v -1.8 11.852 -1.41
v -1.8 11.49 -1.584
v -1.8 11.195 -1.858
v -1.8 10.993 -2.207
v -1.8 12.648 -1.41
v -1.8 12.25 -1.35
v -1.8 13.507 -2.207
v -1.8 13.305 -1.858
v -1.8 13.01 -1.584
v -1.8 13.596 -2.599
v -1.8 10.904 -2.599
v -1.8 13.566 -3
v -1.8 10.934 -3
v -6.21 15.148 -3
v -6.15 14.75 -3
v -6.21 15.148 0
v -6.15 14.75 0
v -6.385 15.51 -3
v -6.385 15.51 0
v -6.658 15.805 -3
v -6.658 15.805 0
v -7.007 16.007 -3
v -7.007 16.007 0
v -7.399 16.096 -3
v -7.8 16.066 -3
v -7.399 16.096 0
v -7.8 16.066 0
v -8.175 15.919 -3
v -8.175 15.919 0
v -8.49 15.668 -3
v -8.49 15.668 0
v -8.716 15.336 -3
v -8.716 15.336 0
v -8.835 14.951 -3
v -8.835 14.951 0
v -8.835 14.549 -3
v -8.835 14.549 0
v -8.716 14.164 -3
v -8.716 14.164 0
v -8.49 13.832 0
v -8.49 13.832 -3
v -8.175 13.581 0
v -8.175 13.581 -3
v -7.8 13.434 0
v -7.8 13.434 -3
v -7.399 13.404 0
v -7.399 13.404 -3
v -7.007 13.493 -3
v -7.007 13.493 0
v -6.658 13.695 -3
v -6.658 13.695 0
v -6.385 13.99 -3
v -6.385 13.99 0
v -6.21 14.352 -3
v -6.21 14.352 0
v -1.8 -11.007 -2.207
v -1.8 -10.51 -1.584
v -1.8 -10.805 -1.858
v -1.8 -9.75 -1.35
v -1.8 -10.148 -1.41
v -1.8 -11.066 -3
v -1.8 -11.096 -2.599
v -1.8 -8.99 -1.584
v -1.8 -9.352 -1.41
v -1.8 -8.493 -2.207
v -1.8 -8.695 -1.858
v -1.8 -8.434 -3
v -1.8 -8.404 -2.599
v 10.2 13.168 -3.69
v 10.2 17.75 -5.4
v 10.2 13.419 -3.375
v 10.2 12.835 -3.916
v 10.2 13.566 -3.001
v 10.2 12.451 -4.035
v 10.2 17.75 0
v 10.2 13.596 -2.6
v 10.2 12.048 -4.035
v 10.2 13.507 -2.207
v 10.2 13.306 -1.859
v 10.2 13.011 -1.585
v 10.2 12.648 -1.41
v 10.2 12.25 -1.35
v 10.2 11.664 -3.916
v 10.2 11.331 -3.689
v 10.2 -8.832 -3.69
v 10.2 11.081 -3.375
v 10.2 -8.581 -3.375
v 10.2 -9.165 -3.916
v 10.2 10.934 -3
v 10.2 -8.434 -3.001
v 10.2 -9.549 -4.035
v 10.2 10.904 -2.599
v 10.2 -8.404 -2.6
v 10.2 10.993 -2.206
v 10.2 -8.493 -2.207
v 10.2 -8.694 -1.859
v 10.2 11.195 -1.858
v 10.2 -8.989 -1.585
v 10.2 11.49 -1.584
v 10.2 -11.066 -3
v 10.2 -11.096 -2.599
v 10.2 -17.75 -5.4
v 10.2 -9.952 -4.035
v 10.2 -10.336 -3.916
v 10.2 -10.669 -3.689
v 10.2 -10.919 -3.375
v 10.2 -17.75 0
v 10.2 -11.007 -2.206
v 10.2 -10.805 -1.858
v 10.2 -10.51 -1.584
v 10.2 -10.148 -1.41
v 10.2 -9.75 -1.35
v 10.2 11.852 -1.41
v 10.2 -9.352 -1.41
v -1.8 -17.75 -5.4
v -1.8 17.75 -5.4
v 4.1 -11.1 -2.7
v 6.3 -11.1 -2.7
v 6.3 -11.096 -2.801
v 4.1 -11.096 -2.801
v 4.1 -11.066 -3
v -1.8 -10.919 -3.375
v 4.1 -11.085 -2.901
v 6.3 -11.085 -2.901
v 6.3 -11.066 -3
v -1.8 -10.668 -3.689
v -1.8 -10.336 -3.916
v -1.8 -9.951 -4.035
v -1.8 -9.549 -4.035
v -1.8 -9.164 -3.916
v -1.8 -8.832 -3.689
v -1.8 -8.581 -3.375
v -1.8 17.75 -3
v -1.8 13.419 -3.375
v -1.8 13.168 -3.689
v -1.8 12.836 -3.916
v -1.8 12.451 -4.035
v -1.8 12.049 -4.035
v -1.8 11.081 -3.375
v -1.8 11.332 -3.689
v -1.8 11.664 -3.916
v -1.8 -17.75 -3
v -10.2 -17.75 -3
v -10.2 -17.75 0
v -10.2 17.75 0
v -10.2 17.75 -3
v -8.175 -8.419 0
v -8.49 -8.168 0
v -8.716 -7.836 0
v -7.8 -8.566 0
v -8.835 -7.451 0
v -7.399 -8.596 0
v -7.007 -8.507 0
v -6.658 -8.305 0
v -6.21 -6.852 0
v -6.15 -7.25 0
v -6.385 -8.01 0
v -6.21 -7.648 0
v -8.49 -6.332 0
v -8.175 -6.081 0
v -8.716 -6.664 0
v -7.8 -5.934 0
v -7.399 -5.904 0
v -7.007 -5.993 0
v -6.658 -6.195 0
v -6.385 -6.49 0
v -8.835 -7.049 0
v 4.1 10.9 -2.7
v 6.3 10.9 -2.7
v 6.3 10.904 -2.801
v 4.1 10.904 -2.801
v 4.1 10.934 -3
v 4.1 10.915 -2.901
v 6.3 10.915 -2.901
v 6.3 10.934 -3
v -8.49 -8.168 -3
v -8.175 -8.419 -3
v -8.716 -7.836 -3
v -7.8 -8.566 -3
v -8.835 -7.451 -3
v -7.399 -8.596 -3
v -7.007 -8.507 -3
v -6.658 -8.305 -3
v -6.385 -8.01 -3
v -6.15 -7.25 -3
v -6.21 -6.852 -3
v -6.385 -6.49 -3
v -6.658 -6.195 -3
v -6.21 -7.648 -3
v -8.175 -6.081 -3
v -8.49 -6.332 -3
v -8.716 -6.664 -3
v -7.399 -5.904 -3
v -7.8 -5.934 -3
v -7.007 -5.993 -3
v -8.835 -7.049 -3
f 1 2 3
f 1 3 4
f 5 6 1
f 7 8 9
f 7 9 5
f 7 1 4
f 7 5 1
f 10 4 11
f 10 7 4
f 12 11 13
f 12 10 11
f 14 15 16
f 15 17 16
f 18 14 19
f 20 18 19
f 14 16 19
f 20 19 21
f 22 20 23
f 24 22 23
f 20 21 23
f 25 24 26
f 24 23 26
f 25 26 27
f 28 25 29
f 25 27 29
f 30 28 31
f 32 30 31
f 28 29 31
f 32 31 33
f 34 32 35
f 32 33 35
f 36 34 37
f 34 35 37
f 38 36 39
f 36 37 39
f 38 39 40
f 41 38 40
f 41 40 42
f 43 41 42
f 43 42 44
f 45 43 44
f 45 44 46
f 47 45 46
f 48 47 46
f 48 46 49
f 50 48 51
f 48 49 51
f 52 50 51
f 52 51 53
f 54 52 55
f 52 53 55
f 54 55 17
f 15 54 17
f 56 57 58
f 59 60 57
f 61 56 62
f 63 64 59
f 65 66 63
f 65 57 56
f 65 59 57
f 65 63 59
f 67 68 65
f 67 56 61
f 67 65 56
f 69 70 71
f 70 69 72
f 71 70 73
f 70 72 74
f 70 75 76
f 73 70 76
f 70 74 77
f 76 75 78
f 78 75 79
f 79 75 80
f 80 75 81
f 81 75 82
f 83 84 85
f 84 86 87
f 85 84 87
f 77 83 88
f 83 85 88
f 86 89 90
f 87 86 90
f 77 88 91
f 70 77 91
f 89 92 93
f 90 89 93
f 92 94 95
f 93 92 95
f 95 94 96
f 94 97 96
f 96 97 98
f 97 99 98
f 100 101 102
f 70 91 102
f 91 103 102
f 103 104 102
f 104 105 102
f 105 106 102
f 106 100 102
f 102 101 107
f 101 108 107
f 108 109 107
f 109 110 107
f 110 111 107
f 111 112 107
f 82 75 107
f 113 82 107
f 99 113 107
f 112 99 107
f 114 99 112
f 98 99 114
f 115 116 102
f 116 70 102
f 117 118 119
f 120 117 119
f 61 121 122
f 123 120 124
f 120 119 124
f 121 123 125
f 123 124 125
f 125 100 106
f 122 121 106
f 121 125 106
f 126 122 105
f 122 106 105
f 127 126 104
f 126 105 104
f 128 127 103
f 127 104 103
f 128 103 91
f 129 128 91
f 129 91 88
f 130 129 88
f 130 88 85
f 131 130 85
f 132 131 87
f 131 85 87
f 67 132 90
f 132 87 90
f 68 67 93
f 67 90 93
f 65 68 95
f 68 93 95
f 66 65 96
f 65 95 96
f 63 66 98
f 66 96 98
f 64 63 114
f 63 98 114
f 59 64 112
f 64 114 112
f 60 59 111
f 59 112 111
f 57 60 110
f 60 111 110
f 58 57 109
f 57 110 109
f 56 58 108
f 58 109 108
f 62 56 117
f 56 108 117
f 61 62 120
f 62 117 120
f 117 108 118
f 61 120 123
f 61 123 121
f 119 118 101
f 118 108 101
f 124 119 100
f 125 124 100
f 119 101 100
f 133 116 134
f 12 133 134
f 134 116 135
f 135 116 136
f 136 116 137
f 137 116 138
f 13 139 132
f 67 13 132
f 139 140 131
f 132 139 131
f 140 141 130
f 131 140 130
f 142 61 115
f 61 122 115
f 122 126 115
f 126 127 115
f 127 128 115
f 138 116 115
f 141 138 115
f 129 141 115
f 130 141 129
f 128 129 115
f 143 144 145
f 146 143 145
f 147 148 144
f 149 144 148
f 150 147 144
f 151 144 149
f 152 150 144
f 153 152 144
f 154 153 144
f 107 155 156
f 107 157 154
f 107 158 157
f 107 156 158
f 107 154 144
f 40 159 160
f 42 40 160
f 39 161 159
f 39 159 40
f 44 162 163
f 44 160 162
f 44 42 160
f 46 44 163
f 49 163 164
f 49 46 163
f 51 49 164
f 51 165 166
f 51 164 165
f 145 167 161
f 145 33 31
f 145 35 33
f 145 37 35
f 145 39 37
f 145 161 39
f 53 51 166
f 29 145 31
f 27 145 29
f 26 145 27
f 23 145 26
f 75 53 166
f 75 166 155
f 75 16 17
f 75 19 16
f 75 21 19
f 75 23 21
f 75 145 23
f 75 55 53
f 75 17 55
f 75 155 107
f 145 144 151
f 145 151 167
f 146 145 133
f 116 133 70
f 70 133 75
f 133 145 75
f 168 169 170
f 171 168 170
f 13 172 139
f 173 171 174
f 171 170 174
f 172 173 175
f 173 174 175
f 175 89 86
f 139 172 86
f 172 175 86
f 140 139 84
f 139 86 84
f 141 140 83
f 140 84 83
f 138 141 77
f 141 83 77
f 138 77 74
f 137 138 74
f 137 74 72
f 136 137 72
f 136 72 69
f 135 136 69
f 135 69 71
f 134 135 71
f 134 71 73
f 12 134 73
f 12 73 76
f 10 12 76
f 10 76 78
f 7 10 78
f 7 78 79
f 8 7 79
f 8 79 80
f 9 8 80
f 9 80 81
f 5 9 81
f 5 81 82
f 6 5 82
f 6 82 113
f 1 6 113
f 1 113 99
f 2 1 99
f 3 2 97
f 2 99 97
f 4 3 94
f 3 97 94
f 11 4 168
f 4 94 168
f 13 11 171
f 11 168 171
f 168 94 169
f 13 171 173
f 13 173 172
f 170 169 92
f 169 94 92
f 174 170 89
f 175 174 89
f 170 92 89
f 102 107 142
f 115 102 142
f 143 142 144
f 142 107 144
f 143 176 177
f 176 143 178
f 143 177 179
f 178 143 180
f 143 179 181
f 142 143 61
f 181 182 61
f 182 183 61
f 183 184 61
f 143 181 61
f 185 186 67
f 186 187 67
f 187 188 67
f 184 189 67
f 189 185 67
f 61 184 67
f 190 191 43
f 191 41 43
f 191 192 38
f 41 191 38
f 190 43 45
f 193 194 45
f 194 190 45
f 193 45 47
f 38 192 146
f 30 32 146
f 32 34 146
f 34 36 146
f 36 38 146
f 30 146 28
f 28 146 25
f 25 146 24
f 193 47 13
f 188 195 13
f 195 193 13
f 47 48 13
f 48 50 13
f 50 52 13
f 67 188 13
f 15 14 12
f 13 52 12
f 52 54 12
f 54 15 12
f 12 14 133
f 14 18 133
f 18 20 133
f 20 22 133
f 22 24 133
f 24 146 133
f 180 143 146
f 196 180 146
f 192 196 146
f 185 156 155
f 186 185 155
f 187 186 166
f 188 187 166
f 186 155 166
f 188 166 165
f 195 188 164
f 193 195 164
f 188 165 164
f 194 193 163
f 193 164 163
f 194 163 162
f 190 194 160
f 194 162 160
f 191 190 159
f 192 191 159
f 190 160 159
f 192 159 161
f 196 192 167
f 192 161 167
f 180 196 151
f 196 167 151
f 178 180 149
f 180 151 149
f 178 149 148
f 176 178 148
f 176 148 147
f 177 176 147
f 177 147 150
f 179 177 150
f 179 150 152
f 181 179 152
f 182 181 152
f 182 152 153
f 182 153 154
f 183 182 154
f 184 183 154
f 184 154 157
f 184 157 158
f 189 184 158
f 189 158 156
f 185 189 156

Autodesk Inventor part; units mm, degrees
ref_plane "YZ Plane" through (0, 0, 0) normal (1, 0, 0) x (0, 1, 0)
ref_plane "XZ Plane" through (0, 0, 0) normal (0, 1, 0) x (-1, 0, 0)
ref_plane "XY Plane" through (0, 0, 0) normal (0, 0, 1) x (1, 0, 0)
ref_plane "작업 평면1" through (0, 0, 0) normal (0, 0, 1) x (1, 0, 0)
sketch "스케치1" plane through (0, 0, 0) normal (0, 0, 1) x (1, 0, 0)
  line L0 (6.3, 9.65) -> (6.3, 14.85) projected
  line L1 (4.1, 9.65) -> (6.3, 9.65) projected
  line L2 (4.1, 14.85) -> (4.1, 9.65) projected
  line L3 (6.3, 14.85) -> (4.1, 14.85) projected
  line L4 (4.1, -7.15) -> (4.1, -12.35) projected
  line L5 (6.3, -7.15) -> (4.1, -7.15) projected
  line L6 (6.3, -12.35) -> (6.3, -7.15) projected
  line L7 (4.1, -12.35) -> (6.3, -12.35) projected
  line L8 (10.2, -17.75) -> (-10.2, -17.75) projected
  line L9 (10.2, 17.75) -> (10.2, -17.75) projected
  line L10 (-10.2, 17.75) -> (10.2, 17.75) projected
  line L11 (-10.2, -17.75) -> (-10.2, 17.75) projected
  circle A0 centre (-7.5, 14.75) radius 1.35 projected
  circle A1 centre (-7.5, -7.25) radius 1.35 projected
  line L12 (-10.2, 17.75) -> (10.2, 17.75)
  line L13 (10.2, 17.75) -> (10.2, -17.75)
  line L14 (10.2, -17.75) -> (-10.2, -17.75)
  line L15 (-10.2, -17.75) -> (-10.2, 17.75)
  point P0 (0, 0)
extrude "돌출1" add sketch "스케치1" against normal blind 3
ref_plane "작업 평면2" through (10.2, 17.75, -3) normal (1, 0, 0) x (0, -1, 0)
sketch "스케치2" plane through (10.2, 17.75, -3) normal (1, 0, 0) x (0, -1, 0)
  circle A0 centre (27.5, -0.3) radius 1.35 projected
  circle A1 centre (5.5, -0.3) radius 1.35 projected
  line L0 (35.5, 2.4) -> (35.5, -3) projected
  line L1 (0, 2.4) -> (35.5, 2.4) projected
  line L2 (0, 2.4) -> (0, -3) projected
  line L3 (0, -3) -> (35.5, -3) projected
  line L4 (0, -3) -> (35.5, -3)
  line L5 (35.5, -3) -> (35.5, 2.4)
  line L6 (35.5, 2.4) -> (0, 2.4)
  line L7 (0, 2.4) -> (0, -3)
  point P0 (17.75, -3)
extrude "돌출2" add sketch "스케치2" against normal blind 12
sketch "스케치3" plane through (10.2, -17.75, 0) normal (1, 0, 0) x (0, 0, -1)
  circle A0 centre (2.7, 8) radius 1.35 projected
  circle A1 centre (2.7, 30) radius 1.35 projected
  line L0 (5.4, 0) -> (0, 0) projected
  line L1 (5.4, 35.5) -> (5.4, 0) projected
  line L2 (5.4, 35.5) -> (0, 35.5) projected
  line L3 (0, 35.5) -> (0, 0) projected
  circle A2 centre (2.7, 30) radius 1.35
  circle A3 centre (2.7, 8) radius 1.35
  point P0 (0, 17.75)
extrude "돌출3" cut sketch "스케치3" against normal blind 12 contours A0 | A1
properties part number "dehind ankle connection_inside" material "PMMA 플라스틱"
